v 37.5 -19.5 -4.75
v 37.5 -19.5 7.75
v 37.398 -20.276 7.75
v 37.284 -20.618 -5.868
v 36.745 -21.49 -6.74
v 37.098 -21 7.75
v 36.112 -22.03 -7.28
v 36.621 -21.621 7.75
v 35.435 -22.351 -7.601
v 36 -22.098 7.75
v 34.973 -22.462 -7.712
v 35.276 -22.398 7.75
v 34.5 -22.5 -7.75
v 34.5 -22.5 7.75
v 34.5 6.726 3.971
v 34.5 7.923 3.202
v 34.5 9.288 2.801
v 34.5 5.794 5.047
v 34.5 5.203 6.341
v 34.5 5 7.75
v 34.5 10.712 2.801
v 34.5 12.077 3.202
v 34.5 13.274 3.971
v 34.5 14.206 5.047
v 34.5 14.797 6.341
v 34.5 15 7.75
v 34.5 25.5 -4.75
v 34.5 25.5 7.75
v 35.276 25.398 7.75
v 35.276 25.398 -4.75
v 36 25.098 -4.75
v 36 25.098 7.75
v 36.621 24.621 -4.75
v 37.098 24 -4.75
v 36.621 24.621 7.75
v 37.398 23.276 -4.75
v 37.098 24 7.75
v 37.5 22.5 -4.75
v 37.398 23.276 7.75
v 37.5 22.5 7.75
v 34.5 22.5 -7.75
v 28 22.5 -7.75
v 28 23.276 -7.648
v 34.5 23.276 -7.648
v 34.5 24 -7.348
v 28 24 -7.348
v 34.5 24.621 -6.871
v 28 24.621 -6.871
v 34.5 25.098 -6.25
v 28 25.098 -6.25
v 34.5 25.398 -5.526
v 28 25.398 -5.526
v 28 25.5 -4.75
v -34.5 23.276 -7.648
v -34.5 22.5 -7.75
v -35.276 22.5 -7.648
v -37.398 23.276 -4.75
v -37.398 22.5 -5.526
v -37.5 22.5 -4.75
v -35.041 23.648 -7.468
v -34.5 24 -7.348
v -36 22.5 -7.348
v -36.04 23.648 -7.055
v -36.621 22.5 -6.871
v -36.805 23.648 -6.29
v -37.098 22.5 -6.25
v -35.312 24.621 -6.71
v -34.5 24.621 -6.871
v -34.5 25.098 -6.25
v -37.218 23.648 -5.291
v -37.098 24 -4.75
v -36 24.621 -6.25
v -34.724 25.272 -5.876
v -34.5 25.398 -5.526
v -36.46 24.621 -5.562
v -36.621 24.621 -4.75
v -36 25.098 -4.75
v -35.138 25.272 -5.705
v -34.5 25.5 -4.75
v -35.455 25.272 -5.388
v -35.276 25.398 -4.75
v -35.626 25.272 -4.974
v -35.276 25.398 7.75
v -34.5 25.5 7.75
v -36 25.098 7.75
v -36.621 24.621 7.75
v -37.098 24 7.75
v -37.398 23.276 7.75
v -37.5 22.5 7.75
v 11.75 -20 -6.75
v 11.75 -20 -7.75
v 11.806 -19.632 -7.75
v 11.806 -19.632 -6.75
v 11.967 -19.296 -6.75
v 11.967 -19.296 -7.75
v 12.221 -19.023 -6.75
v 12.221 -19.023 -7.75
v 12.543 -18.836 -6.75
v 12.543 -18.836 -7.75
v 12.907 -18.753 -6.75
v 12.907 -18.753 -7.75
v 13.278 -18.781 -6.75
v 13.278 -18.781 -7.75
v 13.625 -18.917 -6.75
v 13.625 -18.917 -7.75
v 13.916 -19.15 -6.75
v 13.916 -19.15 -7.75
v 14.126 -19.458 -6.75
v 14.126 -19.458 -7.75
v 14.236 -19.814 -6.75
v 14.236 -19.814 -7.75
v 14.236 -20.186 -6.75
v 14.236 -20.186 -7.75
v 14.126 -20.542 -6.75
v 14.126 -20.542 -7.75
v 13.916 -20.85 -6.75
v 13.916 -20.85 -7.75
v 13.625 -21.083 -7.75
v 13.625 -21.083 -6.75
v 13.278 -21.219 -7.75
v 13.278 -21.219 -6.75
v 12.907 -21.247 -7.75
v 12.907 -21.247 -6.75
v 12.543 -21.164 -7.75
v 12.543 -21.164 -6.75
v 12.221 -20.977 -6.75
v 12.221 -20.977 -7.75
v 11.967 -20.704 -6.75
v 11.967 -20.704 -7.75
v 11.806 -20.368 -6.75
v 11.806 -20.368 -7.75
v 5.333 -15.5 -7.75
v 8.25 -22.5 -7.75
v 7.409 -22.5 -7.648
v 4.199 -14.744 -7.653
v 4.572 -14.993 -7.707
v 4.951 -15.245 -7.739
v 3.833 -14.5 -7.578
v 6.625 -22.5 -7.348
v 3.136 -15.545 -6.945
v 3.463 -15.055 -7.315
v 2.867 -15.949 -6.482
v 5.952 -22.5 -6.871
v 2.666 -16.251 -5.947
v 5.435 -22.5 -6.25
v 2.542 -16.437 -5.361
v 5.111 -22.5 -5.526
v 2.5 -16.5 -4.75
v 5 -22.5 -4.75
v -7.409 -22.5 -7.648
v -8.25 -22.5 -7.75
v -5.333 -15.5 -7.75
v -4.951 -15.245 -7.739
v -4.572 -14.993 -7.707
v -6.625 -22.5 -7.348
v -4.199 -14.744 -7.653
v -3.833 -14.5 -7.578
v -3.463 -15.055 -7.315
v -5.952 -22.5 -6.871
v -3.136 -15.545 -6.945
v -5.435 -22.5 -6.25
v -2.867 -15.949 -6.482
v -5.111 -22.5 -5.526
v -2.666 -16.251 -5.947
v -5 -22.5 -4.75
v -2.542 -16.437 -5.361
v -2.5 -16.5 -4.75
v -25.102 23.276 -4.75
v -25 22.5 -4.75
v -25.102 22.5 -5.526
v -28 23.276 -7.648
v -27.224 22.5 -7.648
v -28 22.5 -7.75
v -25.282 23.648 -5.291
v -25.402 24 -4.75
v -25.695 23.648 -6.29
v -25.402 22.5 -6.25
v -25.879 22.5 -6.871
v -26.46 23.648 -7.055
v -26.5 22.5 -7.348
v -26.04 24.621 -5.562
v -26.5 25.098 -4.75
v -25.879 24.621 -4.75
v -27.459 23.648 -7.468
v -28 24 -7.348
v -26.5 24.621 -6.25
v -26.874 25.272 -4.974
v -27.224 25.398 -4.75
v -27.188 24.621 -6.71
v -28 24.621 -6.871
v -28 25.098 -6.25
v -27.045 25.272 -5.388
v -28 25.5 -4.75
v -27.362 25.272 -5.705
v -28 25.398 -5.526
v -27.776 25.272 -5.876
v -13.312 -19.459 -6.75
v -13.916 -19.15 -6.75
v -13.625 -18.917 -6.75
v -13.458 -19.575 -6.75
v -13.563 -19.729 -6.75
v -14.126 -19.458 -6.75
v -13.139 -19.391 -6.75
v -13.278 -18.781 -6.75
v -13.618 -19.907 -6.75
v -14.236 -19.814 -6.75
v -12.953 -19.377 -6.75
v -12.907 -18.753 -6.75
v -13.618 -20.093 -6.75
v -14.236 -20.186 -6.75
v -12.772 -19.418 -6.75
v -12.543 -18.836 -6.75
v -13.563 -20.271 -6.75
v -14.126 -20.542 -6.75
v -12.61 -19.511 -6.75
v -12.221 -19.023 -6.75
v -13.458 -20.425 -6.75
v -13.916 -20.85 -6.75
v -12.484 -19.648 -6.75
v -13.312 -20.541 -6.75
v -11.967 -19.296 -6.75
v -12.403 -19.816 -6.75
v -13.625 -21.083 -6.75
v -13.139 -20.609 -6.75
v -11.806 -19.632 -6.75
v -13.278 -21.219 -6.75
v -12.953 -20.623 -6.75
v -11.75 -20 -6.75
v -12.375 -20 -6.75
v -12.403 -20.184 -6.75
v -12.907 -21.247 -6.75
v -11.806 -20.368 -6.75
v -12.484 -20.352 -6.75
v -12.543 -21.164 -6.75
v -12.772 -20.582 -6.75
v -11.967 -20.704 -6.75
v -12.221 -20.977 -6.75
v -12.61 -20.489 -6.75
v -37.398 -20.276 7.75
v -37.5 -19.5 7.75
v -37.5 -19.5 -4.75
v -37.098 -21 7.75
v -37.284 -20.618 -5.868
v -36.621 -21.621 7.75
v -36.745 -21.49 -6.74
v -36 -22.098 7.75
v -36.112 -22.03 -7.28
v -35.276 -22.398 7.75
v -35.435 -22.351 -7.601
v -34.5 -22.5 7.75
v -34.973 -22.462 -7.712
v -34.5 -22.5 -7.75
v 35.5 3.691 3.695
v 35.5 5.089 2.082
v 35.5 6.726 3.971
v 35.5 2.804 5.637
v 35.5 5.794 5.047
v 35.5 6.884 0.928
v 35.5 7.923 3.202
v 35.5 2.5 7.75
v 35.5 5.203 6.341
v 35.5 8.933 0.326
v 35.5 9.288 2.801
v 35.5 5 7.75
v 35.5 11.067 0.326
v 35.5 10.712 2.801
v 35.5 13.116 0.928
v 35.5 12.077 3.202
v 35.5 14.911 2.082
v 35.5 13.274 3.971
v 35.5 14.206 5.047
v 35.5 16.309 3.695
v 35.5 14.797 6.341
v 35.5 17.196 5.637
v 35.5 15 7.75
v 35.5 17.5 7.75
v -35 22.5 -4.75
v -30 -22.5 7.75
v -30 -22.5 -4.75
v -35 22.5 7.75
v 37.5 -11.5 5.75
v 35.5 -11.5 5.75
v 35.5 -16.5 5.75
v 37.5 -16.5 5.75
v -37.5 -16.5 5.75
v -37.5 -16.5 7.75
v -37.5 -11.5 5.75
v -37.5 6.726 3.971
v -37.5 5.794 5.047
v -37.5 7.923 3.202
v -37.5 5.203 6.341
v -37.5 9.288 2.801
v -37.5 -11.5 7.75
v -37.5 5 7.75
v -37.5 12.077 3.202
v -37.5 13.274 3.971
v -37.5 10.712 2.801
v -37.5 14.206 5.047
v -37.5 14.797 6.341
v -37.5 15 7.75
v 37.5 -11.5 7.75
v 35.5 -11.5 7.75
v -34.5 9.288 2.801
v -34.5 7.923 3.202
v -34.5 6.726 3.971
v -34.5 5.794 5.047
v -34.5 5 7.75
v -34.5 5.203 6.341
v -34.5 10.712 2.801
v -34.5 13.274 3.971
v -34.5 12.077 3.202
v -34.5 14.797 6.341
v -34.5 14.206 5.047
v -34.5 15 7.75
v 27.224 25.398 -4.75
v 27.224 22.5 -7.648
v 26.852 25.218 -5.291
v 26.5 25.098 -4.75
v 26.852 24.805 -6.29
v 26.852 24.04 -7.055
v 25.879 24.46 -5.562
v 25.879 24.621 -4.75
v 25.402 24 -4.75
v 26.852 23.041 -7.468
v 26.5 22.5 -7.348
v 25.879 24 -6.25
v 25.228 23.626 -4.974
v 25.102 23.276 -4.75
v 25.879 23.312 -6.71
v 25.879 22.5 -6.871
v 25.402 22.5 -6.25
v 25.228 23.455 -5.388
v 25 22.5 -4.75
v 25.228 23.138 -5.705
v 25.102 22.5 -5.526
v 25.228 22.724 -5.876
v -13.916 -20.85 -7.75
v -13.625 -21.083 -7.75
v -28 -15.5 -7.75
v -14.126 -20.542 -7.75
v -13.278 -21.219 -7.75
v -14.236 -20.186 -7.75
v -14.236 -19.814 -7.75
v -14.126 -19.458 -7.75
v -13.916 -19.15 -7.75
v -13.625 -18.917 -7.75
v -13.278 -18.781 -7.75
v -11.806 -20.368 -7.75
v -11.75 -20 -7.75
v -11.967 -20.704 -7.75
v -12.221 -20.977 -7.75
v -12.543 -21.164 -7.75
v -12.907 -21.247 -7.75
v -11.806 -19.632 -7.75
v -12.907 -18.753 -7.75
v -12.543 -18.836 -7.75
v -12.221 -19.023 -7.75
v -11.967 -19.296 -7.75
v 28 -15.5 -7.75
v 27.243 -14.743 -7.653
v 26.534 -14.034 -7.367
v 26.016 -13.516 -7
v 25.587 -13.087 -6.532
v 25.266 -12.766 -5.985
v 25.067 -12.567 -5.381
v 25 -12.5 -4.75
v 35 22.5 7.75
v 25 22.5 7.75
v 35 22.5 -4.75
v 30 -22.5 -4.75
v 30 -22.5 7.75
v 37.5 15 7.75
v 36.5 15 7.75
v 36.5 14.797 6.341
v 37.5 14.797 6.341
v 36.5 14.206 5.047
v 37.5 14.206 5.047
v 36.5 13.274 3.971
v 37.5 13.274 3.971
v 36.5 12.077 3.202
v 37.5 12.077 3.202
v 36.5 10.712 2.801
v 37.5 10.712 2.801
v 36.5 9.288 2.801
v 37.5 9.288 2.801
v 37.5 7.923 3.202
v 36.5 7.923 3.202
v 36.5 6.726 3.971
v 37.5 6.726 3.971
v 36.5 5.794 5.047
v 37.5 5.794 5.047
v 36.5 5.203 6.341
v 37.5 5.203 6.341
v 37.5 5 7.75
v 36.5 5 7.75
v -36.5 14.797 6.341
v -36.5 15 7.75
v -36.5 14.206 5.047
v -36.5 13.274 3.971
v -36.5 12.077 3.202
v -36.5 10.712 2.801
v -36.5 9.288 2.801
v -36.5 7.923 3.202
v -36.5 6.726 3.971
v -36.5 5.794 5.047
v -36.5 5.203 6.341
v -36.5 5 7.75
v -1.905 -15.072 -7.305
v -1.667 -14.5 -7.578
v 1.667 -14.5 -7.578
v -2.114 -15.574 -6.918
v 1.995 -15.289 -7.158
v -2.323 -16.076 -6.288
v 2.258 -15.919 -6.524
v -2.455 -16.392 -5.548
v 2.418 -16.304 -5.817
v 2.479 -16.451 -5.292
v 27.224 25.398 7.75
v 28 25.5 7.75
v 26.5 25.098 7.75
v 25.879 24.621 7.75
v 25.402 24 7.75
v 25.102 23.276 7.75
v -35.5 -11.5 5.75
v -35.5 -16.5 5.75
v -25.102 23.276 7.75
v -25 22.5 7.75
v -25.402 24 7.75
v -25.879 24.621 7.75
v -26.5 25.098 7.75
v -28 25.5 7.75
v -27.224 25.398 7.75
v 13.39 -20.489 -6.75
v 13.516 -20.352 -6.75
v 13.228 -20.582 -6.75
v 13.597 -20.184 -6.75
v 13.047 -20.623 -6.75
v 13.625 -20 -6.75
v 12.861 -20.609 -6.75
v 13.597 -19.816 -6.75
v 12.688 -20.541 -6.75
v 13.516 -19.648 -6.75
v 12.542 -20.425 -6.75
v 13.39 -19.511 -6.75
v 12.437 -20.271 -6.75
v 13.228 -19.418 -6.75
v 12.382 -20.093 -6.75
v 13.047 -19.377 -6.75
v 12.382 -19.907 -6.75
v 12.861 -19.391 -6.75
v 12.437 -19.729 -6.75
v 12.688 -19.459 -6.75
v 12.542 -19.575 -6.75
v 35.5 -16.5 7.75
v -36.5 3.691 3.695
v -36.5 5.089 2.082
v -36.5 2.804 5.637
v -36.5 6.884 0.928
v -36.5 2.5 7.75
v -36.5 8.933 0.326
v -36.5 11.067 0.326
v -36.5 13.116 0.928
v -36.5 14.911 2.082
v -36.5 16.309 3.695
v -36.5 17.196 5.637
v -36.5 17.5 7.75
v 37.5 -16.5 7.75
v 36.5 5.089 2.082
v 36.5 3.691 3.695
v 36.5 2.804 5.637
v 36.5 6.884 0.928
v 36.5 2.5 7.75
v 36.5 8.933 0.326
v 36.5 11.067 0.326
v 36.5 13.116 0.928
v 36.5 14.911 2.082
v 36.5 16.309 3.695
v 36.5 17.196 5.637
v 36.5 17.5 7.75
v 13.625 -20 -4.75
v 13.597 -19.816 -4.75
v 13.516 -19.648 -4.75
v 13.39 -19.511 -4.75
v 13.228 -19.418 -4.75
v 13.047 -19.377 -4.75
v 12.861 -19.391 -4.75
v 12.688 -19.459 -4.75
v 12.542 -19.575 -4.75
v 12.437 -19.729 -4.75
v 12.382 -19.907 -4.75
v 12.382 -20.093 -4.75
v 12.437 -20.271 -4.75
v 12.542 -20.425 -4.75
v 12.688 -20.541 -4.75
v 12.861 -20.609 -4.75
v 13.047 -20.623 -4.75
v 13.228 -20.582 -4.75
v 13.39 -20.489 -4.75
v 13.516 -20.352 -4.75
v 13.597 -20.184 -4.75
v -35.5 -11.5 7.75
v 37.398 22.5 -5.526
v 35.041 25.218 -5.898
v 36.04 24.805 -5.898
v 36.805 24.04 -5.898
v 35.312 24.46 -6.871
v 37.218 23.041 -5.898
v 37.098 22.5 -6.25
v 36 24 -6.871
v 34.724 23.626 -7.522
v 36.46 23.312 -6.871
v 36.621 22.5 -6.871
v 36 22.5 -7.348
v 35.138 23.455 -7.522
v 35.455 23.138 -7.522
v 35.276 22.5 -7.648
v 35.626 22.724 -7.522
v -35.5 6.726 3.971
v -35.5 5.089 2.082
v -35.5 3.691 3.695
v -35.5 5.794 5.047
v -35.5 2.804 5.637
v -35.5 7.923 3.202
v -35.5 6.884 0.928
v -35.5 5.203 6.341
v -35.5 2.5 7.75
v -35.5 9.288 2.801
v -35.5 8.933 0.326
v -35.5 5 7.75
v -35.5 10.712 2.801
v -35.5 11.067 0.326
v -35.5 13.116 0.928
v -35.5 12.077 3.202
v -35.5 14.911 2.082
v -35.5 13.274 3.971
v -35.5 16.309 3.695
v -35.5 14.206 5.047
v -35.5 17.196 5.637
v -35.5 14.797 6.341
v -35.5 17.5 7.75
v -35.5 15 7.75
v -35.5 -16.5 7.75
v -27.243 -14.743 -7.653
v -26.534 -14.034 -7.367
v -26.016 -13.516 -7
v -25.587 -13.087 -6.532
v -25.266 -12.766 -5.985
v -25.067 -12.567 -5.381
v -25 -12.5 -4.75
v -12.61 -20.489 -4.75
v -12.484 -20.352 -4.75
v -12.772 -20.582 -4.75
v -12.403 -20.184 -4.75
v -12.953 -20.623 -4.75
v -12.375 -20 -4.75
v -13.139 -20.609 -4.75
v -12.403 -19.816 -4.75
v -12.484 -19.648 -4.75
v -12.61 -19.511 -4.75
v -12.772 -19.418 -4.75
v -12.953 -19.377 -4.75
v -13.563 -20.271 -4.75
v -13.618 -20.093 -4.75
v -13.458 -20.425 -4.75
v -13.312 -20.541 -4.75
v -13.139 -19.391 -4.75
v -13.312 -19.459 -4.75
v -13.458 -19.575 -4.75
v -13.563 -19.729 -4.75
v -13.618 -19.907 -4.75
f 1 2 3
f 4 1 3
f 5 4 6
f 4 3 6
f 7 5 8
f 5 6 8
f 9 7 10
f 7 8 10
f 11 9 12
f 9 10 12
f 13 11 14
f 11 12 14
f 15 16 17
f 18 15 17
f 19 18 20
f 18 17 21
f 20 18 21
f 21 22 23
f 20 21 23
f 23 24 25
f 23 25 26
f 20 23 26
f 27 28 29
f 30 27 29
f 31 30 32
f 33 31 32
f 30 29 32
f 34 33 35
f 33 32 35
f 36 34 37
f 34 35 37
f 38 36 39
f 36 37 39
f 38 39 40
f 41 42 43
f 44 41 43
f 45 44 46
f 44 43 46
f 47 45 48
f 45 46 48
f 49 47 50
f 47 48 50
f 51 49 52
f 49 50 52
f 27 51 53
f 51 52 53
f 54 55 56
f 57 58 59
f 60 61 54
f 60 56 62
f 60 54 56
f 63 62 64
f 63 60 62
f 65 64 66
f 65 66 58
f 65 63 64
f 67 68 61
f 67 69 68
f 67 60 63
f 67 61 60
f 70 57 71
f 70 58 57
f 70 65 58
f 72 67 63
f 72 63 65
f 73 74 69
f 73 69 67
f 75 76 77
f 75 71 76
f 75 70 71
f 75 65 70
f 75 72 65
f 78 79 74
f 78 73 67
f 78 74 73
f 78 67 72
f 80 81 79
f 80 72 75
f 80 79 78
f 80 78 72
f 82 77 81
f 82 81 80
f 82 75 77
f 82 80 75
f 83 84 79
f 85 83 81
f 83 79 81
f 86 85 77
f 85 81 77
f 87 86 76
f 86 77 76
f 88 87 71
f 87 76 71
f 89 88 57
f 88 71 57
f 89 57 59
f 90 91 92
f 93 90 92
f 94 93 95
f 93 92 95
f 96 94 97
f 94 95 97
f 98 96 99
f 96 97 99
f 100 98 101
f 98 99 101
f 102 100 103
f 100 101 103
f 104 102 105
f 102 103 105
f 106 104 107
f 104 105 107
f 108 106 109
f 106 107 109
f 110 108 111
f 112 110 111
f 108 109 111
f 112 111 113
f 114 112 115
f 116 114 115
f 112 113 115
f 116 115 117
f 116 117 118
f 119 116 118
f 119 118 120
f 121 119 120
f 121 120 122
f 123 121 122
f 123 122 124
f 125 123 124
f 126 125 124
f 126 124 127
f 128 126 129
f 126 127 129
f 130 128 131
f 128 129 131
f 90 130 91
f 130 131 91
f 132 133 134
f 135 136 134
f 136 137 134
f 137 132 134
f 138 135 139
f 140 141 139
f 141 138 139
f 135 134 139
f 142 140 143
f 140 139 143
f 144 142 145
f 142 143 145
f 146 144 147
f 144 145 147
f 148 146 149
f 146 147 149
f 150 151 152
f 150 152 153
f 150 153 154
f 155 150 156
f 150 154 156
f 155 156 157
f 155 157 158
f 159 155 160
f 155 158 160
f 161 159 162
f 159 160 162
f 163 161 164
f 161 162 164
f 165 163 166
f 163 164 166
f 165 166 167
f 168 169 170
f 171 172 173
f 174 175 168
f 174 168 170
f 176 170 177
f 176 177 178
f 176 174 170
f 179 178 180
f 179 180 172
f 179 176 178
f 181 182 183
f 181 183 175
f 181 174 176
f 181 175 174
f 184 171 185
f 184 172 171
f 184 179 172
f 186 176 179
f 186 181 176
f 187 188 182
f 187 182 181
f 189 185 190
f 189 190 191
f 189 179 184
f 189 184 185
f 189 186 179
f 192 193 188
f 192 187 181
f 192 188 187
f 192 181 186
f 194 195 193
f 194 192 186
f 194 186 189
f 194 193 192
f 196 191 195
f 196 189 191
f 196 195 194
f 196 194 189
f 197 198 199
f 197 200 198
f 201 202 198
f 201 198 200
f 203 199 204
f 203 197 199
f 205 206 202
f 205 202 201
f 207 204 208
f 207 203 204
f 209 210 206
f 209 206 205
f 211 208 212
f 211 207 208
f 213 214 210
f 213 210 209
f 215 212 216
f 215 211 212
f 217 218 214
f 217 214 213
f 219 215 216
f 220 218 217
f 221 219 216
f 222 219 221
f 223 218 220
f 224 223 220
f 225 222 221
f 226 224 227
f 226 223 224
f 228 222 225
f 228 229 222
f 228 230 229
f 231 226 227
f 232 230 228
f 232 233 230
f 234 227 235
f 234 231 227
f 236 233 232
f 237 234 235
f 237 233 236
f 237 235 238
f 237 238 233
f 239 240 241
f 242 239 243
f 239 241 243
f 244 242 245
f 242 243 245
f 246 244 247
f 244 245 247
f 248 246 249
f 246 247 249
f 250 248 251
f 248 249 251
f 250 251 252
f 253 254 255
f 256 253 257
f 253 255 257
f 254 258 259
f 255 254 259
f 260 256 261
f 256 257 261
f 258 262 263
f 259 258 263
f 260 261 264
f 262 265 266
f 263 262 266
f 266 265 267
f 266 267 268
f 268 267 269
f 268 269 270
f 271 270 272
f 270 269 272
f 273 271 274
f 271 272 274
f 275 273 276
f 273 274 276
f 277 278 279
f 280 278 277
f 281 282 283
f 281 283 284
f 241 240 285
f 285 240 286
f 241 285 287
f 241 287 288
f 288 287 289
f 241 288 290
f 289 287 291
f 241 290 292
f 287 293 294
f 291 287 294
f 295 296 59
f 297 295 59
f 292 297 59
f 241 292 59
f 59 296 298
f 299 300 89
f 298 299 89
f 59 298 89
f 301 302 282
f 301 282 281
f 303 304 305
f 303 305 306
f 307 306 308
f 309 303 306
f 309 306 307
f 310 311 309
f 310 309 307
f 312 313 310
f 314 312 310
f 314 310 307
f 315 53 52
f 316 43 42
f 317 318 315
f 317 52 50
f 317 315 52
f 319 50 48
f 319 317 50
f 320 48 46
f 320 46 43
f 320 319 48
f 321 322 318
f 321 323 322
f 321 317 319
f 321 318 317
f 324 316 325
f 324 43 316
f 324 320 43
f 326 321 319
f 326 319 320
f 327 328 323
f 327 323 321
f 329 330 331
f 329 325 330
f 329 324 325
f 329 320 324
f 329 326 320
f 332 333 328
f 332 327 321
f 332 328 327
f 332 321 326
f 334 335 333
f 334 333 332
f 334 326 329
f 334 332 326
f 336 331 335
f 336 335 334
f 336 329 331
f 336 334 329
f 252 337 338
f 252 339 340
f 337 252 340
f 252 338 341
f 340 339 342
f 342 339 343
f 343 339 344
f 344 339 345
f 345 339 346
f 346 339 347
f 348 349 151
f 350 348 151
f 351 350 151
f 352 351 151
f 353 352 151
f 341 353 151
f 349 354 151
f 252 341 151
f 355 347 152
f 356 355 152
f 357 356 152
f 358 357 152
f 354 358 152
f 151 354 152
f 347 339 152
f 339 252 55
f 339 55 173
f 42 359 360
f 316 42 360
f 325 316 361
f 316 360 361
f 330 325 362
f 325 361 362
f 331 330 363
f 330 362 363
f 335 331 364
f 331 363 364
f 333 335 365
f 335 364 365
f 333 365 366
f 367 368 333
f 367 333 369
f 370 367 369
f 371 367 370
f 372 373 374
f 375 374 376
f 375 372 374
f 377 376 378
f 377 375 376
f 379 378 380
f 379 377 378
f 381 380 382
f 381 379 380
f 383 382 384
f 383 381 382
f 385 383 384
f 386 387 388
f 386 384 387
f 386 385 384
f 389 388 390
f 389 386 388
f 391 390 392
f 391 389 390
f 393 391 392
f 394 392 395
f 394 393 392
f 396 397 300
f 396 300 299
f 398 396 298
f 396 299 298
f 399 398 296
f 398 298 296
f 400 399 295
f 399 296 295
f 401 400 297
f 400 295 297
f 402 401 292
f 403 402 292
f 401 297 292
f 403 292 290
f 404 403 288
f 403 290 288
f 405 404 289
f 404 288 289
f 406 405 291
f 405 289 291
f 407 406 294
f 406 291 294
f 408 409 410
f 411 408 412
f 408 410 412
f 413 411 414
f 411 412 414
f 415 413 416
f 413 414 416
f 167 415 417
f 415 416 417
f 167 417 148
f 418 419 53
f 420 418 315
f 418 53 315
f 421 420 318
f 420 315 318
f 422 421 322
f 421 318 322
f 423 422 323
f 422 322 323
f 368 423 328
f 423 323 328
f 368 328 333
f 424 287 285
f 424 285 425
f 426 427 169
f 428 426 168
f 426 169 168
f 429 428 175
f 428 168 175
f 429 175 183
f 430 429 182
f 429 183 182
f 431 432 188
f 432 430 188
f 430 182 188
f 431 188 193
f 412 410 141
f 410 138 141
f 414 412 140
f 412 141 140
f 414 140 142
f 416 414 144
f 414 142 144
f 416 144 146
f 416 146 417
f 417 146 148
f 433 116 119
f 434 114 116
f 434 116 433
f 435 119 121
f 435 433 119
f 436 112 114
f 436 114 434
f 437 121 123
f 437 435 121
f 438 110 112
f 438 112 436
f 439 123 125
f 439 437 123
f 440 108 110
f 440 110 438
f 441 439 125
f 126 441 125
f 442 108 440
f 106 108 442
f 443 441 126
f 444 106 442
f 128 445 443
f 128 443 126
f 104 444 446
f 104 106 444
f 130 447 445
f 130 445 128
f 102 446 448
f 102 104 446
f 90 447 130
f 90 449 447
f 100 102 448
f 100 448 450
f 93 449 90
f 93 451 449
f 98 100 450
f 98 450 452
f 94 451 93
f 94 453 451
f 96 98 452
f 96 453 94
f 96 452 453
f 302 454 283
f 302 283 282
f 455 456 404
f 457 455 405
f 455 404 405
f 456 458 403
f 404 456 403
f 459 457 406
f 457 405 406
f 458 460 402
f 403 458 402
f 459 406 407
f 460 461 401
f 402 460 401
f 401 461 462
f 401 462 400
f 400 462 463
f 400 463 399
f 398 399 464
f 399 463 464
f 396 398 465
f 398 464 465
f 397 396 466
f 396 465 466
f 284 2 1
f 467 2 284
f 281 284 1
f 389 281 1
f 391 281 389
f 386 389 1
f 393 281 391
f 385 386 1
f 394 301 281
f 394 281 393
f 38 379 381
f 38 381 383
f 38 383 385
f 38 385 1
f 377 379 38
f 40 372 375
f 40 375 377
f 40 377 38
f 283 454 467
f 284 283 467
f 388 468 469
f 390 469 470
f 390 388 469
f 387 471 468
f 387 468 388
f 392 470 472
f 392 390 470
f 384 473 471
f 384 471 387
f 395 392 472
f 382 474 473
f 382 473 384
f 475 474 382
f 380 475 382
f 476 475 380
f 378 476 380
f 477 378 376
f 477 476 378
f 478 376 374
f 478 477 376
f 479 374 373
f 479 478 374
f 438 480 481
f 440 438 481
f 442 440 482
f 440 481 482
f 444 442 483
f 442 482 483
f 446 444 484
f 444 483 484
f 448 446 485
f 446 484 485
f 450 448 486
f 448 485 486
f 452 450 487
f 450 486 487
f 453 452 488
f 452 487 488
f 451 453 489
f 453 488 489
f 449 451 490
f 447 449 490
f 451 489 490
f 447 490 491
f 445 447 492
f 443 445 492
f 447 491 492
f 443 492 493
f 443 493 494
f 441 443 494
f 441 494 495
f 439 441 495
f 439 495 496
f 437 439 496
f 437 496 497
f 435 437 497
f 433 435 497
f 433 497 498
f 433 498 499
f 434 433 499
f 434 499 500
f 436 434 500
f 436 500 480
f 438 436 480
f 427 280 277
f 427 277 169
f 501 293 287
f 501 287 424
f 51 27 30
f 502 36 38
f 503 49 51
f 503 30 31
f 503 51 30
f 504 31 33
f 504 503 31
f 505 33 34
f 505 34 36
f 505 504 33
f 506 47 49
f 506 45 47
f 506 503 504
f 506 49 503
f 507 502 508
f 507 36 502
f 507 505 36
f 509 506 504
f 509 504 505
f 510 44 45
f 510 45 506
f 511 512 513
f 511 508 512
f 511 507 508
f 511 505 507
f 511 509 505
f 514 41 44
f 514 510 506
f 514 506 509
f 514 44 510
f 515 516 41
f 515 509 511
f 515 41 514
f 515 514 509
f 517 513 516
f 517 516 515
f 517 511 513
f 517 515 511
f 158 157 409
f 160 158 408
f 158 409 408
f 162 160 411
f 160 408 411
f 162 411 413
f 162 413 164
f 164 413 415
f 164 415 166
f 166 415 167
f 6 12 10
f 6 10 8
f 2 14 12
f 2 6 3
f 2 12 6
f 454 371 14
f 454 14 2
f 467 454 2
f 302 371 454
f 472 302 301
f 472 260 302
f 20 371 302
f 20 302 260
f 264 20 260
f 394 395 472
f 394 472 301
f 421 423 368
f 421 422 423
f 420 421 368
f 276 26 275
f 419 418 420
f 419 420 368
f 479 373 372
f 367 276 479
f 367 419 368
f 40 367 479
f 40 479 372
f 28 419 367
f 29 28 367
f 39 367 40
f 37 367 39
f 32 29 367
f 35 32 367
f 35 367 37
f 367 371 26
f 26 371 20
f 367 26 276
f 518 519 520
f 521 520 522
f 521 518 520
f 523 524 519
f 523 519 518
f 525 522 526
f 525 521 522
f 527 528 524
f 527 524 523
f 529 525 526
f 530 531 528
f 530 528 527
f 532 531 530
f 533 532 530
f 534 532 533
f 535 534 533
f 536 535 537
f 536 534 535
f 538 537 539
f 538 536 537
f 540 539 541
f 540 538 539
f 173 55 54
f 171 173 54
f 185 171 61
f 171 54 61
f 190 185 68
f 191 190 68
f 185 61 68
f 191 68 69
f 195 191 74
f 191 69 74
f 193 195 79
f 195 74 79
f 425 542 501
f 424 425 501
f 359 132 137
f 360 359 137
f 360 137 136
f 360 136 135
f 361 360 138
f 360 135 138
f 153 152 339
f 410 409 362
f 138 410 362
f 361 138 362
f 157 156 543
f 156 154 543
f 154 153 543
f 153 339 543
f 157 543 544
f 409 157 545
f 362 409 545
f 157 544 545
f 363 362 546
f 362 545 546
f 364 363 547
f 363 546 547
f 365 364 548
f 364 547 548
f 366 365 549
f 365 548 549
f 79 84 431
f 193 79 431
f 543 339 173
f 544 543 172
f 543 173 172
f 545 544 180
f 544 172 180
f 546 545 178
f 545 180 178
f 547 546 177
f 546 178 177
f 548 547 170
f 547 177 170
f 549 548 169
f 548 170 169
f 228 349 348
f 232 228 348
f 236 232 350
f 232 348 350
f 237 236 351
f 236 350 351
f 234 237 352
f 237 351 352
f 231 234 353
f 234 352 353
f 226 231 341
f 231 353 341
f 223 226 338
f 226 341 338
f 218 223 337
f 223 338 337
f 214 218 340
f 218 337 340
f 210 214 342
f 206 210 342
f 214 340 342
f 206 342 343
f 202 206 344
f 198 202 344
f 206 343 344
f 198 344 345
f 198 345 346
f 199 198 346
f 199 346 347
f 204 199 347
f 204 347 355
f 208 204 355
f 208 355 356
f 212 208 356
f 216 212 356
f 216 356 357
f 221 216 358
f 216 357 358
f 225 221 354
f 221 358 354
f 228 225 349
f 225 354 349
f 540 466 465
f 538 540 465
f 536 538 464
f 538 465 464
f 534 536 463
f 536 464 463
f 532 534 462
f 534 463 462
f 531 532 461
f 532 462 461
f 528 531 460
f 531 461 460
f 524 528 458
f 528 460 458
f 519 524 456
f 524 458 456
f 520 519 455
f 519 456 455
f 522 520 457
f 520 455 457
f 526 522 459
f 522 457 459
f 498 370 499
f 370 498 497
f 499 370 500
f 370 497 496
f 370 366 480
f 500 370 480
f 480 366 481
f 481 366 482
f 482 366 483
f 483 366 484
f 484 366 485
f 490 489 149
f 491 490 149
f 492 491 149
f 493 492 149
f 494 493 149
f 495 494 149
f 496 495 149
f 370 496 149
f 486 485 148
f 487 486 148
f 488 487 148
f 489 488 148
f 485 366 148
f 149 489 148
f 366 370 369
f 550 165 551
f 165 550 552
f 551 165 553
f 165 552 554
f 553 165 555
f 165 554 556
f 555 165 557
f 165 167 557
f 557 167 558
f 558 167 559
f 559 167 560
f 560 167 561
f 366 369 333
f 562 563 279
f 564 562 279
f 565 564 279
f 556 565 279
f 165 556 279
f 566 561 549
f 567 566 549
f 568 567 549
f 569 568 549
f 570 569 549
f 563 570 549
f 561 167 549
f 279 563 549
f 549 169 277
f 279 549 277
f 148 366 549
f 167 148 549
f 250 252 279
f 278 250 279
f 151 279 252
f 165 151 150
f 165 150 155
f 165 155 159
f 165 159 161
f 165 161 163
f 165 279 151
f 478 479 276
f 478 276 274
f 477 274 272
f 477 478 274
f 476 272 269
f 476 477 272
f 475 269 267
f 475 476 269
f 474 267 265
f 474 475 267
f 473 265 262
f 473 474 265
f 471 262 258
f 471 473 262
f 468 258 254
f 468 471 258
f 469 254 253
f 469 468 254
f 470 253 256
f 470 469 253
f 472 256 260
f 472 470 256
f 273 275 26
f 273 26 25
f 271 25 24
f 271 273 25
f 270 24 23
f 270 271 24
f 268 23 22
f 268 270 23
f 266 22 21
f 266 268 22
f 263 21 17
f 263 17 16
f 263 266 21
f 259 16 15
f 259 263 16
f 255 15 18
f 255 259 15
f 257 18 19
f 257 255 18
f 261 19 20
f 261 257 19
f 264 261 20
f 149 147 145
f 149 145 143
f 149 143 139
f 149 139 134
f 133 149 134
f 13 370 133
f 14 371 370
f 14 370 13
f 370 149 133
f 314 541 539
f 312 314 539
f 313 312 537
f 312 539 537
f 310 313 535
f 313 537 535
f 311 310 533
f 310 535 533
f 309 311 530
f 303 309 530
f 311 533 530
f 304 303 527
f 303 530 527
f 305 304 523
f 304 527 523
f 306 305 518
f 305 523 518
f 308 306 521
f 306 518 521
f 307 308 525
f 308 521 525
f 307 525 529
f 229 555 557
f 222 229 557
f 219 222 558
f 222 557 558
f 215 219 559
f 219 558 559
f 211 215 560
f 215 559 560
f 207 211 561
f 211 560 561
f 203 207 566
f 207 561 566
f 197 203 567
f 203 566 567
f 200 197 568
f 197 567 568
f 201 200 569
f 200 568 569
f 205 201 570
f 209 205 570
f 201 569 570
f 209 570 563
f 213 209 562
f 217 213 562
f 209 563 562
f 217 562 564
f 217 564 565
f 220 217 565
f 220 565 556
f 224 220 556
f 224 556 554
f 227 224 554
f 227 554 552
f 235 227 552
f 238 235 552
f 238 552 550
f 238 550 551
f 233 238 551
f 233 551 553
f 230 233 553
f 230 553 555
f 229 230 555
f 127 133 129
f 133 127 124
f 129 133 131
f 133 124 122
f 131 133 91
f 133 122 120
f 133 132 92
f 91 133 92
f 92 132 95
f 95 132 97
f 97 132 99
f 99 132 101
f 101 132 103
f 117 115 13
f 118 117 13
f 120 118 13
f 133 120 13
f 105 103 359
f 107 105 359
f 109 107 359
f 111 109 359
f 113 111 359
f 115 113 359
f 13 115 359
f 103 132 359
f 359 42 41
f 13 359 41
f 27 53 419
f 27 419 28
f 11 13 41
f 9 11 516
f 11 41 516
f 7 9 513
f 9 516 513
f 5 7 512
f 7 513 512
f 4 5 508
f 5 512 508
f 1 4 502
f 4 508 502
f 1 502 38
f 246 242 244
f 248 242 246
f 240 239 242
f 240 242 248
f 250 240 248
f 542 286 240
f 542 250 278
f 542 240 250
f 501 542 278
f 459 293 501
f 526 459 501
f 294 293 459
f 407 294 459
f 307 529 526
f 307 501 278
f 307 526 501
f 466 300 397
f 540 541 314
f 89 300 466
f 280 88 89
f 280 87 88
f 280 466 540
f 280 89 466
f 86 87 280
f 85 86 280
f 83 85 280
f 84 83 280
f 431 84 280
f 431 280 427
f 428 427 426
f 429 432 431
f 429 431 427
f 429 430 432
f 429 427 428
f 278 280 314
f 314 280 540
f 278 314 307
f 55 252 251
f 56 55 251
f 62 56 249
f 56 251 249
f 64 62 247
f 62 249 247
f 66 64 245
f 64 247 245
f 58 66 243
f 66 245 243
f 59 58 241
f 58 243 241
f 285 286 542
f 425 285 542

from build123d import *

# Parameters (mm, degrees)
SKETCH1_W           = 75
SKETCH1_H           = 48
BOSS_EXTRUDE1_DEPTH = 7.75
CUT_EXTRUDE1_DEPTH  = 12.5
SKETCH3_W           = 50
SKETCH3_H           = 38
CUT_EXTRUDE2_DEPTH  = 48.924419663
SKETCH4_R           = 0.625
CUT_EXTRUDE3_DEPTH  = 12.5
FILLET1_R           = 3
SKETCH7_R           = 1.25
CUT_EXTRUDE4_DEPTH  = 1
SKETCH8_W           = 2
SKETCH8_H           = 5
CUT_EXTRUDE5_DEPTH  = 2
SKETCH9_R           = 5
CUT_EXTRUDE6_DEPTH  = 3
SKETCH10_R          = 7.5
CUT_EXTRUDE7_DEPTH  = 0.5


with BuildPart() as part:
    # Sketch1 → Boss-Extrude1 (new, symmetric)
    with BuildSketch(Plane.XY):
        with Locations((0, 1.5)):
            Rectangle(SKETCH1_W, SKETCH1_H)
    extrude(amount=BOSS_EXTRUDE1_DEPTH, both=True)

    # Sketch2 → Cut-Extrude1 (cut)
    with BuildSketch(Plane.XY.offset(7.75)):
        Polygon((-35, 22.5), (35, 22.5), (30, -22.5), (-30, -22.5), align=None)
    extrude(amount=-CUT_EXTRUDE1_DEPTH, mode=Mode.SUBTRACT)

    # Sketch3 → Cut-Extrude2 (cut, through all)
    with BuildSketch(Plane(origin=(0, 0, -7.75), x_dir=(-1, 0, 0), z_dir=(0, 0, -1))):
        with Locations((0, 6.5)):
            Rectangle(SKETCH3_W, SKETCH3_H)
    extrude(amount=-CUT_EXTRUDE2_DEPTH, mode=Mode.SUBTRACT)

    # Sketch4 → Cut-Extrude3 (cut)
    with BuildSketch(Plane.XY):
        with Locations((-13, -20)):
            Circle(SKETCH4_R)
        with Locations((13, -20)):
            Circle(SKETCH4_R)
        Polygon((2.5, -16.5), (5, -22.5), (-5, -22.5), (-2.5, -16.5), align=None)
    extrude(amount=-CUT_EXTRUDE3_DEPTH, mode=Mode.SUBTRACT)

    # Fillet1
    # the kernel refuses this fillet: 3 mm, written as the material it takes off along each edge
    with BuildSketch(Plane(origin=(34.5, 22.5, -4.75), x_dir=(1, 0, 0), z_dir=(0, 0, -1))) as fillet1_piece_1_section:
        Polygon((0, 0), (FILLET1_R, 0), (FILLET1_R, -FILLET1_R), (0, -FILLET1_R), align=None)
    fillet1_piece_1 = extrude(amount=FILLET1_R, mode=Mode.PRIVATE)
    fillet1_piece_1 = fillet1_piece_1 - Plane(origin=(34.5, 22.5, -4.75), x_dir=(-0.7071067811865475, -0.7071067811865475, 0), z_dir=(0, 0, -1)) * Sphere(FILLET1_R, mode=Mode.PRIVATE)
    add(fillet1_piece_1, mode=Mode.SUBTRACT)
    with BuildSketch(Plane(origin=(28, 22.5, -4.75), x_dir=(0, 0, -1), z_dir=(-1, 0, 0))) as fillet1_piece_2_section:
        Polygon((0, 0), (FILLET1_R, 0), (FILLET1_R, -FILLET1_R), (0, -FILLET1_R), align=None)
    fillet1_piece_2 = extrude(amount=FILLET1_R, mode=Mode.PRIVATE)
    fillet1_piece_2 = fillet1_piece_2 - Plane(origin=(28, 22.5, -4.75), x_dir=(0, -0.7071067811865475, 0.7071067811865475), z_dir=(-1, 0, 0)) * Sphere(FILLET1_R, mode=Mode.PRIVATE)
    add(fillet1_piece_2, mode=Mode.SUBTRACT)
    with BuildSketch(Plane(origin=(-28, 22.5, -4.75), x_dir=(1, 0, 0), z_dir=(0, 1, 0))) as fillet1_piece_3_section:
        Polygon((0, 0), (FILLET1_R, 0), (FILLET1_R, FILLET1_R), (0, FILLET1_R), align=None)
    fillet1_piece_3 = extrude(amount=FILLET1_R, mode=Mode.PRIVATE)
    fillet1_piece_3 = fillet1_piece_3 - Plane(origin=(-28, 22.5, -4.75), x_dir=(-0.7071067811865475, 0, 0.7071067811865475), z_dir=(0, 1, 0)) * Sphere(FILLET1_R, mode=Mode.PRIVATE)
    add(fillet1_piece_3, mode=Mode.SUBTRACT)
    with BuildSketch(Plane(origin=(-34.5, 22.5, -4.75), x_dir=(-1, 0, 0), z_dir=(0, 1, 0))) as fillet1_piece_4_section:
        Polygon((0, 0), (FILLET1_R, 0), (FILLET1_R, -FILLET1_R), (0, -FILLET1_R), align=None)
    fillet1_piece_4 = extrude(amount=FILLET1_R, mode=Mode.PRIVATE)
    fillet1_piece_4 = fillet1_piece_4 - Plane(origin=(-34.5, 22.5, -4.75), x_dir=(0.7071067811865475, 0, 0.7071067811865475), z_dir=(0, 1, 0)) * Sphere(FILLET1_R, mode=Mode.PRIVATE)
    add(fillet1_piece_4, mode=Mode.SUBTRACT)
    with BuildSketch(Plane(origin=(0.384615385, -9.576923077, -7.75), x_dir=(-0.9230769230769234, 0.3846153846153842, 0), z_dir=(-0.3846153846153842, -0.9230769230769232, 0))) as fillet1_piece_5_section:
        with BuildLine():
            CenterArc((FILLET1_R, -FILLET1_R), FILLET1_R, 90, 90)
            Line((0, -FILLET1_R), (0, 0))
            Line((0, 0), (FILLET1_R, 0))
        make_face()
    fillet1_piece_5 = extrude(amount=21.5, mode=Mode.PRIVATE)
    fillet1_piece_5 = split(fillet1_piece_5, bisect_by=Plane(origin=(-5.860923252, -16.5, -7.063308452), z_dir=(0, -1, 0)), keep=Keep.TOP, mode=Mode.PRIVATE)
    add(fillet1_piece_5, mode=Mode.SUBTRACT)
    with BuildSketch(Plane(origin=(7.884615385, -29.423076923, -7.75), x_dir=(0.923076923076923, 0.3846153846153847, 0), z_dir=(-0.3846153846153847, 0.9230769230769231, 0))) as fillet1_piece_6_section:
        with BuildLine():
            CenterArc((FILLET1_R, -FILLET1_R), FILLET1_R, 90, 90)
            Line((0, -FILLET1_R), (0, 0))
            Line((0, 0), (FILLET1_R, 0))
        make_face()
    fillet1_piece_6 = extrude(amount=21.5, mode=Mode.PRIVATE)
    fillet1_piece_6 = split(fillet1_piece_6, bisect_by=Plane(origin=(5.860923252, -16.5, -7.063308452), z_dir=(0, -1, 0)), keep=Keep.TOP, mode=Mode.PRIVATE)
    add(fillet1_piece_6, mode=Mode.SUBTRACT)
    with BuildSketch(Plane(origin=(10, -16.5, -7.75), x_dir=(0, 1, 0), z_dir=(-1, 0, 0))) as fillet1_piece_7_section:
        with BuildLine():
            CenterArc((FILLET1_R, -FILLET1_R), FILLET1_R, 90, 90)
            Line((0, -FILLET1_R), (0, 0))
            Line((0, 0), (FILLET1_R, 0))
        make_face()
    fillet1_piece_7 = extrude(amount=20, mode=Mode.PRIVATE)
    fillet1_piece_7 = split(fillet1_piece_7, bisect_by=Plane(origin=(-1.916956866, -15.100696479, -7.024372447), z_dir=(0.9230769230769232, -0.3846153846153842, 0)), keep=Keep.TOP, mode=Mode.PRIVATE)
    fillet1_piece_7 = split(fillet1_piece_7, bisect_by=Plane(origin=(1.916956866, -15.100696479, -7.024372447), z_dir=(-0.9230769230769231, -0.3846153846153847, 0)), keep=Keep.TOP, mode=Mode.PRIVATE)
    add(fillet1_piece_7, mode=Mode.SUBTRACT)
    with BuildSketch(Plane(origin=(-25, -12.5, -7.75), x_dir=(0, -1, 0), z_dir=(1, 0, 0))) as fillet1_piece_8:
        with BuildLine():
            CenterArc((FILLET1_R, -FILLET1_R), FILLET1_R, 90, 90)
            Line((0, -FILLET1_R), (0, 0))
            Line((0, 0), (FILLET1_R, 0))
        make_face()
    extrude(amount=50, mode=Mode.SUBTRACT)
    with BuildSketch(Plane(origin=(37.5, 25.5, 15.25), x_dir=(0, -1, 0), z_dir=(0, 0, -1)), Plane(origin=(-25, 25.5, -4.75), x_dir=(-1, 0, 0), z_dir=(0, 0, 1))) as fillet1_piece_9:
        with BuildLine():
            CenterArc((FILLET1_R, FILLET1_R), FILLET1_R, 180, 90)
            Line((0, FILLET1_R), (0, 0))
            Line((0, 0), (FILLET1_R, 0))
        make_face()
    extrude(amount=20, mode=Mode.SUBTRACT)
    with BuildSketch(Plane(origin=(28, 25.5, -7.75), x_dir=(0, -1, 0), z_dir=(1, 0, 0))) as fillet1_piece_10:
        with BuildLine():
            CenterArc((FILLET1_R, -FILLET1_R), FILLET1_R, 90, 90)
            Line((0, -FILLET1_R), (0, 0))
            Line((0, 0), (FILLET1_R, 0))
        make_face()
    extrude(amount=6.5, mode=Mode.SUBTRACT)
    with BuildSketch(Plane(origin=(25, 25.5, -4.75), x_dir=(1, 0, 0), z_dir=(0, 0, 1)), Plane(origin=(-37.5, 25.5, -4.75), x_dir=(1, 0, 0), z_dir=(0, 0, 1))) as fillet1_piece_11:
        with BuildLine():
            CenterArc((FILLET1_R, -FILLET1_R), FILLET1_R, 90, 90)
            Line((0, -FILLET1_R), (0, 0))
            Line((0, 0), (FILLET1_R, 0))
        make_face()
    extrude(amount=20, mode=Mode.SUBTRACT)
    with BuildSketch(Plane(origin=(-34.5, 25.5, -7.75), x_dir=(0, 0, 1), z_dir=(1, 0, 0))) as fillet1_piece_12:
        with BuildLine():
            CenterArc((FILLET1_R, FILLET1_R), FILLET1_R, 180, 90)
            Line((0, FILLET1_R), (0, 0))
            Line((0, 0), (FILLET1_R, 0))
        make_face()
    extrude(amount=6.5, mode=Mode.SUBTRACT)
    with BuildSketch(Plane(origin=(-37.5, -30, -7.75), x_dir=(0, 0, 1), z_dir=(0, 1, 0))) as fillet1_piece_13:
        with BuildLine():
            CenterArc((FILLET1_R, FILLET1_R), FILLET1_R, 180, 90)
            Line((0, FILLET1_R), (0, 0))
            Line((0, 0), (FILLET1_R, 0))
        make_face()
    extrude(amount=52.5, mode=Mode.SUBTRACT)
    with BuildSketch(Plane(origin=(-25, 22.5, -7.75), x_dir=(0, 0, 1), z_dir=(0, -1, 0))) as fillet1_piece_14:
        with BuildLine():
            CenterArc((FILLET1_R, FILLET1_R), FILLET1_R, 180, 90)
            Line((0, FILLET1_R), (0, 0))
            Line((0, 0), (FILLET1_R, 0))
        make_face()
    extrude(amount=35, mode=Mode.SUBTRACT)
    with BuildSketch(Plane(origin=(25, -12.5, -7.75), x_dir=(1, 0, 0), z_dir=(0, 1, 0))) as fillet1_piece_15:
        with BuildLine():
            CenterArc((FILLET1_R, -FILLET1_R), FILLET1_R, 90, 90)
            Line((0, -FILLET1_R), (0, 0))
            Line((0, 0), (FILLET1_R, 0))
        make_face()
    extrude(amount=35, mode=Mode.SUBTRACT)
    with BuildSketch(Plane(origin=(37.5, 22.5, -7.75), x_dir=(-1, 0, 0), z_dir=(0, -1, 0))) as fillet1_piece_16:
        with BuildLine():
            CenterArc((FILLET1_R, -FILLET1_R), FILLET1_R, 90, 90)
            Line((0, -FILLET1_R), (0, 0))
            Line((0, 0), (FILLET1_R, 0))
        make_face()
    extrude(amount=52.5, mode=Mode.SUBTRACT)
    with BuildSketch(Plane(origin=(-37.5, -22.5, -15.25), x_dir=(0, 1, 0), z_dir=(0, 0, 1))) as fillet1_piece_17:
        with BuildLine():
            CenterArc((FILLET1_R, -FILLET1_R), FILLET1_R, 90, 90)
            Line((0, -FILLET1_R), (0, 0))
            Line((0, 0), (FILLET1_R, 0))
        make_face()
    extrude(amount=30.5, mode=Mode.SUBTRACT)
    with BuildSketch(Plane(origin=(37.5, -22.5, 15.25), x_dir=(-1, 0, 0), z_dir=(0, 0, -1))) as fillet1_piece_18:
        with BuildLine():
            CenterArc((FILLET1_R, FILLET1_R), FILLET1_R, 180, 90)
            Line((0, FILLET1_R), (0, 0))
            Line((0, 0), (FILLET1_R, 0))
        make_face()
    extrude(amount=30.5, mode=Mode.SUBTRACT)
    with BuildSketch(Plane(origin=(0.384615385, -9.576923077, -7.75), x_dir=(-0.9230769230769234, 0.3846153846153842, 0), z_dir=(-0.3846153846153842, -0.9230769230769232, 0))) as fillet1_piece_19a_section:
        with BuildLine():
            CenterArc((FILLET1_R, -FILLET1_R), FILLET1_R, 90, 90)
            Line((0, -FILLET1_R), (0, 0))
            Line((0, 0), (FILLET1_R, 0))
        make_face()
    fillet1_piece_19a = extrude(amount=21.5, mode=Mode.PRIVATE)
    fillet1_piece_19a = split(fillet1_piece_19a, bisect_by=Plane(origin=(-1.76151966, -16.5, -7.084043842), z_dir=(0, 1, 0)), keep=Keep.TOP, mode=Mode.PRIVATE)
    with BuildSketch(Plane(origin=(10, -16.5, -7.75), x_dir=(0, 1, 0), z_dir=(-1, 0, 0))) as fillet1_piece_19b_section:
        with BuildLine():
            CenterArc((FILLET1_R, -FILLET1_R), FILLET1_R, 90, 90)
            Line((0, -FILLET1_R), (0, 0))
            Line((0, 0), (FILLET1_R, 0))
        make_face()
    fillet1_piece_19b = extrude(amount=20, mode=Mode.PRIVATE)
    fillet1_piece_19b = split(fillet1_piece_19b, bisect_by=Plane(origin=(-2.7840309, -17.18167416, -7.084043842), z_dir=(-0.9230769230769232, 0.3846153846153842, 0)), keep=Keep.TOP, mode=Mode.PRIVATE)
    fillet1_piece_19 = fillet1_piece_19a & fillet1_piece_19b
    add(fillet1_piece_19, mode=Mode.SUBTRACT)
    with BuildSketch(Plane(origin=(10, -16.5, -7.75), x_dir=(0, 1, 0), z_dir=(-1, 0, 0))) as fillet1_piece_20a_section:
        with BuildLine():
            CenterArc((FILLET1_R, -FILLET1_R), FILLET1_R, 90, 90)
            Line((0, -FILLET1_R), (0, 0))
            Line((0, 0), (FILLET1_R, 0))
        make_face()
    fillet1_piece_20a = extrude(amount=20, mode=Mode.PRIVATE)
    fillet1_piece_20a = split(fillet1_piece_20a, bisect_by=Plane(origin=(2.7840309, -17.18167416, -7.084043842), z_dir=(0.9230769230769231, 0.3846153846153847, 0)), keep=Keep.TOP, mode=Mode.PRIVATE)
    with BuildSketch(Plane(origin=(7.884615385, -29.423076923, -7.75), x_dir=(0.923076923076923, 0.3846153846153847, 0), z_dir=(-0.3846153846153847, 0.9230769230769231, 0))) as fillet1_piece_20b_section:
        with BuildLine():
            CenterArc((FILLET1_R, -FILLET1_R), FILLET1_R, 90, 90)
            Line((0, -FILLET1_R), (0, 0))
            Line((0, 0), (FILLET1_R, 0))
        make_face()
    fillet1_piece_20b = extrude(amount=21.5, mode=Mode.PRIVATE)
    fillet1_piece_20b = split(fillet1_piece_20b, bisect_by=Plane(origin=(1.76151966, -16.5, -7.084043842), z_dir=(0, 1, 0)), keep=Keep.TOP, mode=Mode.PRIVATE)
    fillet1_piece_20 = fillet1_piece_20a & fillet1_piece_20b
    add(fillet1_piece_20, mode=Mode.SUBTRACT)
    with BuildSketch(Plane(origin=(-25, 22.5, -7.75), x_dir=(0, 0, 1), z_dir=(0, -1, 0))) as fillet1_piece_21a_section:
        with BuildLine():
            CenterArc((FILLET1_R, FILLET1_R), FILLET1_R, 180, 90)
            Line((0, FILLET1_R), (0, 0))
            Line((0, 0), (FILLET1_R, 0))
        make_face()
    fillet1_piece_21a = extrude(amount=42.5, mode=Mode.PRIVATE)
    fillet1_piece_21a = split(fillet1_piece_21a, bisect_by=Plane(origin=(-25.679185343, -12.5, -7.070814657), z_dir=(0, -1, 0)), keep=Keep.TOP, mode=Mode.PRIVATE)
    with BuildSketch(Plane(origin=(-32.5, -12.5, -7.75), x_dir=(0, -1, 0), z_dir=(1, 0, 0))) as fillet1_piece_21b_section:
        with BuildLine():
            CenterArc((FILLET1_R, -FILLET1_R), FILLET1_R, 90, 90)
            Line((0, -FILLET1_R), (0, 0))
            Line((0, 0), (FILLET1_R, 0))
        make_face()
    fillet1_piece_21b = extrude(amount=57.5, mode=Mode.PRIVATE)
    fillet1_piece_21b = split(fillet1_piece_21b, bisect_by=Plane(origin=(-25, -13.179185343, -7.070814657), z_dir=(-1, 0, 0)), keep=Keep.TOP, mode=Mode.PRIVATE)
    fillet1_piece_21 = fillet1_piece_21a & fillet1_piece_21b
    add(fillet1_piece_21, mode=Mode.SUBTRACT)
    with BuildSketch(Plane(origin=(25, -20, -7.75), x_dir=(1, 0, 0), z_dir=(0, 1, 0))) as fillet1_piece_22a_section:
        with BuildLine():
            CenterArc((FILLET1_R, -FILLET1_R), FILLET1_R, 90, 90)
            Line((0, -FILLET1_R), (0, 0))
            Line((0, 0), (FILLET1_R, 0))
        make_face()
    fillet1_piece_22a = extrude(amount=42.5, mode=Mode.PRIVATE)
    fillet1_piece_22a = split(fillet1_piece_22a, bisect_by=Plane(origin=(25.679185343, -12.5, -7.070814657), z_dir=(0, -1, 0)), keep=Keep.TOP, mode=Mode.PRIVATE)
    with BuildSketch(Plane(origin=(-25, -12.5, -7.75), x_dir=(0, -1, 0), z_dir=(1, 0, 0))) as fillet1_piece_22b_section:
        with BuildLine():
            CenterArc((FILLET1_R, -FILLET1_R), FILLET1_R, 90, 90)
            Line((0, -FILLET1_R), (0, 0))
            Line((0, 0), (FILLET1_R, 0))
        make_face()
    fillet1_piece_22b = extrude(amount=57.5, mode=Mode.PRIVATE)
    fillet1_piece_22b = split(fillet1_piece_22b, bisect_by=Plane(origin=(25, -13.179185343, -7.070814657), z_dir=(1, 0, 0)), keep=Keep.TOP, mode=Mode.PRIVATE)
    fillet1_piece_22 = fillet1_piece_22a & fillet1_piece_22b
    add(fillet1_piece_22, mode=Mode.SUBTRACT)

    # Sketch7 → Cut-Extrude4 (cut)
    with BuildSketch(Plane(origin=(0, 0, -7.75), x_dir=(-1, 0, 0), z_dir=(0, 0, -1))):
        with Locations((-13, -20)):
            Circle(SKETCH7_R)
        with Locations(Location((13, -20, 0), (0, 0, 180))):
            Circle(SKETCH7_R)
    extrude(amount=-CUT_EXTRUDE4_DEPTH, mode=Mode.SUBTRACT)

    # Sketch8 → Cut-Extrude5 (cut)
    with BuildSketch(Plane.XY.offset(7.75)):
        with Locations((-36.5, -14)):
            Rectangle(SKETCH8_W, SKETCH8_H)
        with Locations((36.5, -14)):
            Rectangle(SKETCH8_W, SKETCH8_H)
    extrude(amount=-CUT_EXTRUDE5_DEPTH, mode=Mode.SUBTRACT)

    # Sketch9 → Cut-Extrude6 (cut)
    with BuildSketch(Plane.ZY.offset(37.5)):
        with Locations((7.75, 10)):
            Circle(SKETCH9_R)
    cut_extrude6 = extrude(amount=-CUT_EXTRUDE6_DEPTH, mode=Mode.SUBTRACT)

    # Sketch10 → Cut-Extrude7 (cut, symmetric)
    with BuildSketch(Plane.ZY.offset(36)):
        with Locations((7.75, 10)):
            Circle(SKETCH10_R)
    cut_extrude7 = extrude(amount=CUT_EXTRUDE7_DEPTH, both=True, mode=Mode.SUBTRACT)

    # Mirror1: Cut-Extrude6, Cut-Extrude7 across plane
    add(cut_extrude6.mirror(Plane(origin=(0, 0, 0), x_dir=(0, 0, 1), z_dir=(1, 0, 0))), mode=Mode.SUBTRACT)
    add(cut_extrude7.mirror(Plane(origin=(0, 0, 0), x_dir=(0, 0, 1), z_dir=(1, 0, 0))), mode=Mode.SUBTRACT)


solid = part.part
